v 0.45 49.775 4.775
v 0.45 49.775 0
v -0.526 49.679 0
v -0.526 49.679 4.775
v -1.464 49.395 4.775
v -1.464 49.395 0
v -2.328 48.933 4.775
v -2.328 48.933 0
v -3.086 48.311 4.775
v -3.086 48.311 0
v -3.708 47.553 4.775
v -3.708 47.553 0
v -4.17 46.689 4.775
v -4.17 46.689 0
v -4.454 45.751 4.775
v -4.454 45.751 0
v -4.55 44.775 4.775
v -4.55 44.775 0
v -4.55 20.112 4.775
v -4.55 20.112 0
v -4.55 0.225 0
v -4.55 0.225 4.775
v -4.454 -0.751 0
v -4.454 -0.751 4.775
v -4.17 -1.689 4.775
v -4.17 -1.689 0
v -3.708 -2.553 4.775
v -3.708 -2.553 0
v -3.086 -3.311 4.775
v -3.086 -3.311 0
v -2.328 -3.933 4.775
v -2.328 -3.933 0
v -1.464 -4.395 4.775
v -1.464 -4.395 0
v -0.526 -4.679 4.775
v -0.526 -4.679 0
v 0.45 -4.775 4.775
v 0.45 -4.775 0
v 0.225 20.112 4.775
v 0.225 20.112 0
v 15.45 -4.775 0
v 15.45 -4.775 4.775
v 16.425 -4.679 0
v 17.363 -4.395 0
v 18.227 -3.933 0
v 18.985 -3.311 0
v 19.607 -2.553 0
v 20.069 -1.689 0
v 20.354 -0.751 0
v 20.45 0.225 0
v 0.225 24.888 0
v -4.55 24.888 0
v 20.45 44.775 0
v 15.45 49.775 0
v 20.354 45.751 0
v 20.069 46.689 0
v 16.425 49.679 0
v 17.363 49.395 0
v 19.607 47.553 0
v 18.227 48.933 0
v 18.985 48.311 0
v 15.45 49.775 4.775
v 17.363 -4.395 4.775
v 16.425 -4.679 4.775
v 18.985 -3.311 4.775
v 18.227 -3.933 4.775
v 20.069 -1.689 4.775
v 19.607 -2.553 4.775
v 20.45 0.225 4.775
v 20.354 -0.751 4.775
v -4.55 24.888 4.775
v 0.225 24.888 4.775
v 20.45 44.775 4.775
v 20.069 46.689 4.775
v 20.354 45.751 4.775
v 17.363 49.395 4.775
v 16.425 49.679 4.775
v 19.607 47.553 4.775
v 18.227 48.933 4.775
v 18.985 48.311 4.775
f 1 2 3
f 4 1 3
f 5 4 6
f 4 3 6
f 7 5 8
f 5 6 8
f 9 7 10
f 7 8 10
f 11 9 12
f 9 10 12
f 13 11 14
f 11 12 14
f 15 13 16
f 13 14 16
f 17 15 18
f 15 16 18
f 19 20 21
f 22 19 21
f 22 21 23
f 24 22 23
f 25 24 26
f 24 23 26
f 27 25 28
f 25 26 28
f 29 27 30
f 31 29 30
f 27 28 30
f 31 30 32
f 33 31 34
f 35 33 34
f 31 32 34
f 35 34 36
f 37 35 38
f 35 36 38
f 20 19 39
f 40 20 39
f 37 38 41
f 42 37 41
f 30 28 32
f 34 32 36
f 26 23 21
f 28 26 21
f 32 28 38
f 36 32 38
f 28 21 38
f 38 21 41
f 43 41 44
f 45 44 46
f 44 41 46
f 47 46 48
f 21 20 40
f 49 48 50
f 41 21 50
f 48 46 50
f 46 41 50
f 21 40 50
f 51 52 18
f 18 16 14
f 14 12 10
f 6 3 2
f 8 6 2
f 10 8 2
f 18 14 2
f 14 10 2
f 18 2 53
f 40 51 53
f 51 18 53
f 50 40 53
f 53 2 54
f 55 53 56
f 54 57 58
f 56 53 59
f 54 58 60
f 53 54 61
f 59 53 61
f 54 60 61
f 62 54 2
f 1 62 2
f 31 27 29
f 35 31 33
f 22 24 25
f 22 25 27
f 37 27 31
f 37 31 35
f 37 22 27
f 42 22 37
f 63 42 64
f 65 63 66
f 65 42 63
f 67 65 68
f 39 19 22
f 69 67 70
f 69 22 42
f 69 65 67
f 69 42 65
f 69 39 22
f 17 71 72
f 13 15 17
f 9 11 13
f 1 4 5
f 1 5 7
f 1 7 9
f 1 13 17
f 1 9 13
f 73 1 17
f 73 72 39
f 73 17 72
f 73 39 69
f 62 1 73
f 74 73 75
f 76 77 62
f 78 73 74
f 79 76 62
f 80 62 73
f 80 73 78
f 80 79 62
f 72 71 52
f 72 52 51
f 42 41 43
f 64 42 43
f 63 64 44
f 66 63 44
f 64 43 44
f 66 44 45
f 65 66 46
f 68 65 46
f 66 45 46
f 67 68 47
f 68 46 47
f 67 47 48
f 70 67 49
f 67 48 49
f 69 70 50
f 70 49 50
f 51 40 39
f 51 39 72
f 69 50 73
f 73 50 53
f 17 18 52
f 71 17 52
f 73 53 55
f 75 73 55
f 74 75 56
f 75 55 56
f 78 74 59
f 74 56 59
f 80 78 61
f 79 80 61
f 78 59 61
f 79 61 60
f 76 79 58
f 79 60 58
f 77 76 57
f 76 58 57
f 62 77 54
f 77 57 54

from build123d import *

# Parameters (mm, degrees)
BOSS_EXTRUDE1_DEPTH = 4.7752
SKETCH4_W           = 4.7752
SKETCH4_H           = 4.7752
CUT_EXTRUDE1_DEPTH  = 5.7752


with BuildPart() as part:
    # Sketch1 → Boss-Extrude1 (new body)
    with BuildSketch(Plane.XY):
        with BuildLine():
            Line((-4.5504, 44.7752), (-4.5504, 0.2248))
            ThreePointArc((-4.5504, 0.2248), (-3.085933906, -3.310733906), (0.4496, -4.7752))
            Line((0.4496, -4.7752), (15.4496, -4.7752))
            ThreePointArc((15.4496, -4.7752), (18.985133906, -3.310733906), (20.4496, 0.2248))
            Line((20.4496, 0.2248), (20.4496, 44.7752))
            ThreePointArc((20.4496, 44.7752), (18.985133906, 48.310733906), (15.4496, 49.7752))
            Line((15.4496, 49.7752), (0.4496, 49.7752))
            ThreePointArc((0.4496, 49.7752), (-3.085933906, 48.310733906), (-4.5504, 44.7752))
        make_face()
    extrude(amount=BOSS_EXTRUDE1_DEPTH)

    # Sketch4 → Cut-Extrude1 (cut, through all)
    with BuildSketch(Plane.XY.offset(4.7752)):
        with Locations((-2.1628, 22.5)):
            Rectangle(SKETCH4_W, SKETCH4_H)
    extrude(amount=-CUT_EXTRUDE1_DEPTH, mode=Mode.SUBTRACT)


solid = part.part
